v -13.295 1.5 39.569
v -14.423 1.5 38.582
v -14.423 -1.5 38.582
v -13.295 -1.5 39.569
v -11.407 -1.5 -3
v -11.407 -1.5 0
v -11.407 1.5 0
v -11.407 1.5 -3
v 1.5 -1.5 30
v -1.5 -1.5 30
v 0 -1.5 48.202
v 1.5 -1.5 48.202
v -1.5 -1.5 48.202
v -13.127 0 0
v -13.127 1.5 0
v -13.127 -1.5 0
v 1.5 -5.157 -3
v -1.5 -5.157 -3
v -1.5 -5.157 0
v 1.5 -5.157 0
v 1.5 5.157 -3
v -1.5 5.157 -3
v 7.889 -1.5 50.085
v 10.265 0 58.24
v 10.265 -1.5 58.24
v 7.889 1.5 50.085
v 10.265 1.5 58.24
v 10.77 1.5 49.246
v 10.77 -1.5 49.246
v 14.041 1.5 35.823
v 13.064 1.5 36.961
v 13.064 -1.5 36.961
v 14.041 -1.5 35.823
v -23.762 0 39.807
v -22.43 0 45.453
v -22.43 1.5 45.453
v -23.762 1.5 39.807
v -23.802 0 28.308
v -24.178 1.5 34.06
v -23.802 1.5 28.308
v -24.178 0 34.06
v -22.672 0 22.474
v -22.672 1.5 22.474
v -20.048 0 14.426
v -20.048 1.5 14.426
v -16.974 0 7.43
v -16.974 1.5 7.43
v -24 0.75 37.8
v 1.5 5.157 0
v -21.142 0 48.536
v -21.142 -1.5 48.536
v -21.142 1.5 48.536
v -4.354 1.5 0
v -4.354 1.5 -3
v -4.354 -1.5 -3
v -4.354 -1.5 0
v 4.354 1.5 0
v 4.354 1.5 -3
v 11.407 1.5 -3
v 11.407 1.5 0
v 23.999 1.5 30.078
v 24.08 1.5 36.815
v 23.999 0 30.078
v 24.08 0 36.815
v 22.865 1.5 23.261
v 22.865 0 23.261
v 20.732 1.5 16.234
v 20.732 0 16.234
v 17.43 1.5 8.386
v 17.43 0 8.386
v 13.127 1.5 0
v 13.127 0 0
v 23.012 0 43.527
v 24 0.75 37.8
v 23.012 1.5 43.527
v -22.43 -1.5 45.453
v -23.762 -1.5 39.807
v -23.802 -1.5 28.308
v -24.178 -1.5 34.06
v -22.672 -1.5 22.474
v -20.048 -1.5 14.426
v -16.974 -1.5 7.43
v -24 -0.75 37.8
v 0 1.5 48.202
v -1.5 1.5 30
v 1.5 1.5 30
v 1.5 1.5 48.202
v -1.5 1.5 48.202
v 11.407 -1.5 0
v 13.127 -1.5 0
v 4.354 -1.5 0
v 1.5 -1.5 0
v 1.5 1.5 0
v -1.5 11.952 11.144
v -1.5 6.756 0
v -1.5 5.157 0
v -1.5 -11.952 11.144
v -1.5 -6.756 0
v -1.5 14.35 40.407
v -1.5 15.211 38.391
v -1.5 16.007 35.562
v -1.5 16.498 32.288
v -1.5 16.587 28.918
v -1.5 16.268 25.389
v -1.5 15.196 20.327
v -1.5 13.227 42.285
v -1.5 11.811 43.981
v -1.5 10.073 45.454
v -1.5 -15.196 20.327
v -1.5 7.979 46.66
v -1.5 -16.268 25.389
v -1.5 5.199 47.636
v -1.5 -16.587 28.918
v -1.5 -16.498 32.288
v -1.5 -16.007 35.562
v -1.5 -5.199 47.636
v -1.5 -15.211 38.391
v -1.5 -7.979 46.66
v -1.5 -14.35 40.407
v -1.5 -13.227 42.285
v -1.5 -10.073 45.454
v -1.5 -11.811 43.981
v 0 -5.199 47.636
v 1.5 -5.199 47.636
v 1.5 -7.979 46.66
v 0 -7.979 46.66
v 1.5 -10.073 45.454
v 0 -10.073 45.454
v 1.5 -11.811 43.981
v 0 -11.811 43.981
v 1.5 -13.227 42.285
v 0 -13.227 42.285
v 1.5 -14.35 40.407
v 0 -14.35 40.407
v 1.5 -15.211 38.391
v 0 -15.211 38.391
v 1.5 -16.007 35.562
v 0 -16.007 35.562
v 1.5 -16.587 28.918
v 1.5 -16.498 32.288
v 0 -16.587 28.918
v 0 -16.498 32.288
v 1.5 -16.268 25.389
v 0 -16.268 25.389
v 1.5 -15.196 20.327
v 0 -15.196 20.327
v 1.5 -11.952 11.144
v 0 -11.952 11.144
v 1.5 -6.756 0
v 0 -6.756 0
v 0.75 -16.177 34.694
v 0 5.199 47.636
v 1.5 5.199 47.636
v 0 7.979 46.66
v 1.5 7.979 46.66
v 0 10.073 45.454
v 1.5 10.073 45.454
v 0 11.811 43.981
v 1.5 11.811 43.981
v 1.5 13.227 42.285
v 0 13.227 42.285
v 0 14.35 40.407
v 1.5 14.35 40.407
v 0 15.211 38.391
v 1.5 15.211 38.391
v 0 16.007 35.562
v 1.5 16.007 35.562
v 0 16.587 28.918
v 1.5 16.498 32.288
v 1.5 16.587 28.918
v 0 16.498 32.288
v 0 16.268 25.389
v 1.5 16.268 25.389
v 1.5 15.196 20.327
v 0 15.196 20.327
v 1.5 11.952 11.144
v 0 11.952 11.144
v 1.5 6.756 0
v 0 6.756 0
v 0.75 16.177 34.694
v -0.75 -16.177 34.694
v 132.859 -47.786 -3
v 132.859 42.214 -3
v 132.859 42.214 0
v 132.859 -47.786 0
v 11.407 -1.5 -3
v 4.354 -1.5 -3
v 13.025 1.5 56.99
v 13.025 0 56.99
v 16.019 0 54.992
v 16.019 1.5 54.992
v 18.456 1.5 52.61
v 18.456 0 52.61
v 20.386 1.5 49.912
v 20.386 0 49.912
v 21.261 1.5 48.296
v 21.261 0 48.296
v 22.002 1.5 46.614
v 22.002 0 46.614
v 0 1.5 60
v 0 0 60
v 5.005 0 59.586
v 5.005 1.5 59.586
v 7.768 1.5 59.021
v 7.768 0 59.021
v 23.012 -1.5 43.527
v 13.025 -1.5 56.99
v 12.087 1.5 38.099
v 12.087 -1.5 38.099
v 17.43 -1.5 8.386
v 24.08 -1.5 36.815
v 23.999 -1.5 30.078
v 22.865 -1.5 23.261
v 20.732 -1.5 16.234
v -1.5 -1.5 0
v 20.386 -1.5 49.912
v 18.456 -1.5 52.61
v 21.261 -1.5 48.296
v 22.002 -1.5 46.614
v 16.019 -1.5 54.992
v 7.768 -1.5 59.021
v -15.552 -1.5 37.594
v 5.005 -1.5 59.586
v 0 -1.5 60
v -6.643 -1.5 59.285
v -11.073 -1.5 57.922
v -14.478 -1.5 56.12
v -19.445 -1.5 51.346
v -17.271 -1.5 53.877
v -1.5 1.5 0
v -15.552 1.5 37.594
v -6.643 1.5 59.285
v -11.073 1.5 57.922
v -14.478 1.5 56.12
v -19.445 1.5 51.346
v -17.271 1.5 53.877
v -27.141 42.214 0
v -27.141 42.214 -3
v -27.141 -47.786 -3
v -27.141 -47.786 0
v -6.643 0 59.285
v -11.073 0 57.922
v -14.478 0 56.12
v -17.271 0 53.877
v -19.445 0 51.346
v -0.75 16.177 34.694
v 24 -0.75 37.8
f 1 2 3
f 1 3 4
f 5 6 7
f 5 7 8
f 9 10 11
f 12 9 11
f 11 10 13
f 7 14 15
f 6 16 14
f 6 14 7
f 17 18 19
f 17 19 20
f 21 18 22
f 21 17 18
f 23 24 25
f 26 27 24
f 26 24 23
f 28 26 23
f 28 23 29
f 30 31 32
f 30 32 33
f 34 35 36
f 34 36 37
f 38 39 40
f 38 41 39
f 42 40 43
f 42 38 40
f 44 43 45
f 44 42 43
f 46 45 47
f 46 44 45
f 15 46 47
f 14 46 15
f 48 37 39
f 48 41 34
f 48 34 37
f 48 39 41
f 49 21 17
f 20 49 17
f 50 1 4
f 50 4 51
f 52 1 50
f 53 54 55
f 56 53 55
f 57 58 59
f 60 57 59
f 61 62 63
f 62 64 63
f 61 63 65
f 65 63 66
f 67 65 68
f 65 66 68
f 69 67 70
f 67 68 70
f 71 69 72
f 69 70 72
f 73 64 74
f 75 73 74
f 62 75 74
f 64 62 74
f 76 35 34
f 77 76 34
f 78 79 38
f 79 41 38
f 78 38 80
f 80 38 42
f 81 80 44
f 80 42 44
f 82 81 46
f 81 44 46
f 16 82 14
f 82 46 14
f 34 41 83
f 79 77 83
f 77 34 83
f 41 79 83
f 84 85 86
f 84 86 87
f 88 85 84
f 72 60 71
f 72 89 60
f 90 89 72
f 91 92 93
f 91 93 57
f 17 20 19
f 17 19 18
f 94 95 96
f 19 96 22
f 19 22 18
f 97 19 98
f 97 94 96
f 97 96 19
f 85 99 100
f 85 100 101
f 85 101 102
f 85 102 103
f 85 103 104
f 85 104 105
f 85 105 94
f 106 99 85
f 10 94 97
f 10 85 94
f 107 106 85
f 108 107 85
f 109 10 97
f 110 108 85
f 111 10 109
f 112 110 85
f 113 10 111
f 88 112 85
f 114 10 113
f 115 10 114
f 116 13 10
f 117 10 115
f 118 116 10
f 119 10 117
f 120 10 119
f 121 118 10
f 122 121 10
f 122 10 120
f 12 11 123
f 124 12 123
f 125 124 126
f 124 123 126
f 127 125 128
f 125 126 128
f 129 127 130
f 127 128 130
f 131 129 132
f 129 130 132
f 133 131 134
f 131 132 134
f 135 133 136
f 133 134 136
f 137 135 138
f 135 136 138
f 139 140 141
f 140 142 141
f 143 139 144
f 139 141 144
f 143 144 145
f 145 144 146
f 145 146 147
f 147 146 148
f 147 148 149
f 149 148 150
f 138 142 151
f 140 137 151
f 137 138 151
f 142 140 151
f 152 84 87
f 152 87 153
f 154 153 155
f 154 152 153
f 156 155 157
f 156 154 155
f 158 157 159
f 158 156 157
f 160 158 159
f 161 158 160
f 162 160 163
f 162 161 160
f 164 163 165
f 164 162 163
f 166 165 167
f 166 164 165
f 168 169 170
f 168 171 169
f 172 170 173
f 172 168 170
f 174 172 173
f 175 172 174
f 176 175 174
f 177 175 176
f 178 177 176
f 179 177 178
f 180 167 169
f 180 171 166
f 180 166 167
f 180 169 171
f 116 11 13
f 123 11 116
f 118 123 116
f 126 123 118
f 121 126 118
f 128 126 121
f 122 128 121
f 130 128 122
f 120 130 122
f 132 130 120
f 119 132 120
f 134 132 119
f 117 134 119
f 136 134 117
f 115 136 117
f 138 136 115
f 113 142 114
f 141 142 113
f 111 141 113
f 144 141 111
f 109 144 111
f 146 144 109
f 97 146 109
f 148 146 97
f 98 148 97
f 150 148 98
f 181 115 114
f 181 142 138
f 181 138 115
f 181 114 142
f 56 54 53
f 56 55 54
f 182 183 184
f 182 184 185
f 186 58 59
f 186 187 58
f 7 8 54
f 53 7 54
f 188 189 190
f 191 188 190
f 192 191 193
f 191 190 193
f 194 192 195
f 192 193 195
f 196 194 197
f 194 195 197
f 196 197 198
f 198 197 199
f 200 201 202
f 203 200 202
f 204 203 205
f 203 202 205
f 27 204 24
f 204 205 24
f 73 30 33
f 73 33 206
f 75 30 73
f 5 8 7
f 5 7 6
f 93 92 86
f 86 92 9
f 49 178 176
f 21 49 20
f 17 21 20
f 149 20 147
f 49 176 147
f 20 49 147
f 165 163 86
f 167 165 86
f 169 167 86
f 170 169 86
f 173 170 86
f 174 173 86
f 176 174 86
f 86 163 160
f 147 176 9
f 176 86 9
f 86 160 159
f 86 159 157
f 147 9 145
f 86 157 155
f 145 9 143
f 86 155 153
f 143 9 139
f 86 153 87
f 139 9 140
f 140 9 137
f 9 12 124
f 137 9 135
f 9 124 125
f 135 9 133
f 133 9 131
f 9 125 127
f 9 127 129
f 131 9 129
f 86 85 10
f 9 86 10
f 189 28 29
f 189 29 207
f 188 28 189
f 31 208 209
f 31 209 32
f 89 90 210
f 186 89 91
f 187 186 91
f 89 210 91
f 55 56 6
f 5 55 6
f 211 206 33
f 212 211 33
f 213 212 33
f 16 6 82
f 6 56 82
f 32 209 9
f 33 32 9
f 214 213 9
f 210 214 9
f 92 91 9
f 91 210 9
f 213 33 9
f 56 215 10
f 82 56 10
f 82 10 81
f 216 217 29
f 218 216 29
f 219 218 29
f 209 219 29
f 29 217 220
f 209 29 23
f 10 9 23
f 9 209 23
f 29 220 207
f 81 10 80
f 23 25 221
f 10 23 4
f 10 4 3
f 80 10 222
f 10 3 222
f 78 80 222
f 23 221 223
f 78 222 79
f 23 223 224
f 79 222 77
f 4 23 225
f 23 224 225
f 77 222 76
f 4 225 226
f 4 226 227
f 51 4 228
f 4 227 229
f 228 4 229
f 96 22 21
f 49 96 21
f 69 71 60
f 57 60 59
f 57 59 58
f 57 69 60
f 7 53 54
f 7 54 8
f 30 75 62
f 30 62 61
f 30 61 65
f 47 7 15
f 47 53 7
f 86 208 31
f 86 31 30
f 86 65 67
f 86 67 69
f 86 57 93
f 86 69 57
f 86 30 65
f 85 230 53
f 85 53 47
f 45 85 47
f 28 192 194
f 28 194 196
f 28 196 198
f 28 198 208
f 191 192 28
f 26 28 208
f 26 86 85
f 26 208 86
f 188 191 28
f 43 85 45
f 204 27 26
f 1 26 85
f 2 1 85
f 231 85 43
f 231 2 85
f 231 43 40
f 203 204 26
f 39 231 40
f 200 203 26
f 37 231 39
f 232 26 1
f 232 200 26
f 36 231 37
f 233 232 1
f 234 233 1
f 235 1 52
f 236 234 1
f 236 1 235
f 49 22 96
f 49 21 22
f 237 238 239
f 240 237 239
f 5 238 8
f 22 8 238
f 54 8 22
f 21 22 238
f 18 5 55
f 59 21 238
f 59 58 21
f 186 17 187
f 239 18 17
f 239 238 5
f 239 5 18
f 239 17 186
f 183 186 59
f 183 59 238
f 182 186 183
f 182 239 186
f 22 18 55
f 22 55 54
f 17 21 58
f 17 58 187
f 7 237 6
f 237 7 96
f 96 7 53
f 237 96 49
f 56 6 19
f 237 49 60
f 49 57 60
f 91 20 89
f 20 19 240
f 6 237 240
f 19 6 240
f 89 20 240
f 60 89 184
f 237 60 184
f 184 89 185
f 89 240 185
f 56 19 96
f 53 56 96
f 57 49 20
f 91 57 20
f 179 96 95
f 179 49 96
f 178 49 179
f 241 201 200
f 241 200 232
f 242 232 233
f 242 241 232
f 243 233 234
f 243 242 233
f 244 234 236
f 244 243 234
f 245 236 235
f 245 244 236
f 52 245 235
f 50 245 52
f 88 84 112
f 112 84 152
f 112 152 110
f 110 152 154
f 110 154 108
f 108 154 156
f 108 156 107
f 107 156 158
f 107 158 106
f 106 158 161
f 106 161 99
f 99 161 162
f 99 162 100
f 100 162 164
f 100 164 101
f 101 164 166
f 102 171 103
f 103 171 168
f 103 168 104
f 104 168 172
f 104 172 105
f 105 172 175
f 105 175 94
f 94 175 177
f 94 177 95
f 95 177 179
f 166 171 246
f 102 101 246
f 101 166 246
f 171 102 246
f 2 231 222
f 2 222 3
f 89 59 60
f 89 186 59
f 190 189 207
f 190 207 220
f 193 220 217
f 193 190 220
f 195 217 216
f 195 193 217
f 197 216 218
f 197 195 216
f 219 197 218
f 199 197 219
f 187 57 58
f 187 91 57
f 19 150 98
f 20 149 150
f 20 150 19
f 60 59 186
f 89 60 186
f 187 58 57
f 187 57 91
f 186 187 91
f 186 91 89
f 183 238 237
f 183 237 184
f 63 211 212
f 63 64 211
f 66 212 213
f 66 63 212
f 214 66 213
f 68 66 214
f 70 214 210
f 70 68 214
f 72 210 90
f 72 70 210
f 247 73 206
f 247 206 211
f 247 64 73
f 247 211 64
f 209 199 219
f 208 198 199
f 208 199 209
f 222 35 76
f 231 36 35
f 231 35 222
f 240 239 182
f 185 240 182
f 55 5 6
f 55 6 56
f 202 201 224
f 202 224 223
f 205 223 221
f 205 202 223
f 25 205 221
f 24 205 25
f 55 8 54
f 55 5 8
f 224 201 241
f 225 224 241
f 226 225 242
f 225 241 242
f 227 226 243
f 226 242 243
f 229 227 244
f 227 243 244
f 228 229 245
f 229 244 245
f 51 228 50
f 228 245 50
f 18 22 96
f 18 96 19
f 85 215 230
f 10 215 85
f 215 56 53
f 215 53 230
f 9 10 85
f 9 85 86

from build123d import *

# Parameters (mm, degrees)
F2_DEPTH  = 1.5
F3_W      = 3
F3_H      = 60
F4_DEPTH  = 12.5
F6_DEPTH  = 1.5
F7_W      = 3
F7_H      = 118.8950859686
F8_DEPTH  = 25.6788023262
F9_W      = 160
F9_H      = 90
F9_W_2    = 7.0525689516
F9_H_2    = 3
F9_W_3    = 3
F9_H_3    = 10.3145539761
F10_DEPTH = 3


with BuildPart() as f2:
    # F1 (on Front) → F2 (new body, symmetric)
    with BuildSketch(Plane.XZ):
        with BuildLine():
            add(Edge.make_bspline(
                [(0, 60), (17.6886934787, 59.6921108663), (28.8150999704, 36.4639480961), (21.0301392591, 14.3927453736), (13.1268969518, 0)],
                knots=[0, 0, 0, 0, 0.4769048689, 1, 1, 1, 1], degree=3))
            add(Edge.make_bspline(
                [(0, 60), (-17.6886934787, 59.6921108663), (-28.8150999704, 36.4639480961), (-21.0301392591, 14.3927453736), (-13.1268969518, 0)],
                knots=[0, 0, 0, 0, 0.4769048689, 1, 1, 1, 1], degree=3))
            Line((-13.1268969518, 0), (-11.4066828974, 0))
            Line((-11.4066828974, 0), (-11.4066828974, -3))
            Line((-11.4066828974, -3), (-4.3541139457, -3))
            Line((-4.3541139457, -3), (-4.3541139457, 0))
            Line((-4.3541139457, 0), (-1.3768739169, 0))
            Line((-1.3768739169, 0), (1.6231260831, 0))
            Line((1.6231260831, 0), (4.3541139457, 0))
            Line((4.3541139457, 0), (4.3541139457, -3))
            Line((4.3541139457, -3), (11.4066828974, -3))
            Line((11.4066828974, -3), (11.4066828974, 0))
            Line((11.4066828974, 0), (13.1268969518, 0))
        make_face()
    extrude(amount=F2_DEPTH, both=True)

    # F3 (on Front) → F4 (cut, symmetric)
    with BuildSketch(Plane.XZ):
        Polygon((-29.232794809, 55.5032887742), (-30.3615614893, 54.5154194603), (-15.5521072394, 37.5937292362), (-14.423340559, 38.5815985501), (-13.2945738787, 39.569467864), (-28.1040281286, 56.4911580881), align=None)
        Polygon((9.3295652531, 49.6656731565), (10.7697102072, 49.2461704614), (15.4308512639, 65.2477810624), (13.9907063099, 65.6672837575), (12.5505613558, 66.0867864526), (7.889420299, 50.0851758516), align=None)
        Polygon((14.0412059324, 35.8228163902), (33.0070190747, 52.1107853198), (32.0297409389, 53.2487341083), (31.0524628031, 54.3866828969), (12.0866496609, 38.0987139673), (13.0639277966, 36.9607651787), align=None)
        Rectangle(F3_W, F3_H)
    extrude(amount=F4_DEPTH, both=True, mode=Mode.SUBTRACT)


with BuildPart() as f6:
    # F5 (on Right) → F6 (new body, symmetric)
    with BuildSketch(Plane.YZ):
        with BuildLine():
            add(Edge.make_bspline(
                [(0, 48.2573099434), (11.0439748989, 48.1600549317), (20.0297831515, 33.0199316806), (14.8643427644, 16.1332041346), (6.7557687632, 0)],
                knots=[0, 0, 0, 0, 0.4338424438, 1, 1, 1, 1], degree=3))
            add(Edge.make_bspline(
                [(0, 48.2573099434), (-11.0439748989, 48.1600549317), (-20.0297831515, 33.0199316806), (-14.8643427644, 16.1332041346), (-6.7557687632, 0)],
                knots=[0, 0, 0, 0, 0.4338424438, 1, 1, 1, 1], degree=3))
            Line((-6.7557687632, 0), (-5.157276988, 0))
            Line((-5.157276988, 0), (-5.157276988, -3))
            Line((-5.157276988, -3), (5.157276988, -3))
            Line((5.157276988, -3), (5.157276988, 0))
            Line((5.157276988, 0), (6.7557687632, 0))
        make_face()
    extrude(amount=F6_DEPTH, both=True)

    # F7 (on face) → F8 (cut, through all)
    with BuildSketch(Plane(origin=(-1.5, 0, 0), x_dir=(0, -1, 0), z_dir=(-1, 0, 0))):
        with Locations((0, 89.4475429843)):
            Rectangle(F7_W, F7_H)
    extrude(amount=-F8_DEPTH, mode=Mode.SUBTRACT)


with BuildPart() as f10:
    # F9 (on face) → F10 (new body)
    with BuildSketch(Plane(origin=(0, 0, -3), x_dir=(1, 0, 0), z_dir=(0, 0, -1))):
        with Locations((52.8585895896, 2.7859684825)):
            Rectangle(F9_W, F9_H)
        with Locations((-7.8803984215, 0)):
            Rectangle(F9_W_2, F9_H_2, mode=Mode.SUBTRACT)
        Rectangle(F9_W_3, F9_H_3, mode=Mode.SUBTRACT)
        with Locations((7.8803984215, 0)):
            Rectangle(F9_W_2, F9_H_2, mode=Mode.SUBTRACT)
    extrude(amount=-F10_DEPTH)


solid = Compound([f2.part, f6.part, f10.part])
